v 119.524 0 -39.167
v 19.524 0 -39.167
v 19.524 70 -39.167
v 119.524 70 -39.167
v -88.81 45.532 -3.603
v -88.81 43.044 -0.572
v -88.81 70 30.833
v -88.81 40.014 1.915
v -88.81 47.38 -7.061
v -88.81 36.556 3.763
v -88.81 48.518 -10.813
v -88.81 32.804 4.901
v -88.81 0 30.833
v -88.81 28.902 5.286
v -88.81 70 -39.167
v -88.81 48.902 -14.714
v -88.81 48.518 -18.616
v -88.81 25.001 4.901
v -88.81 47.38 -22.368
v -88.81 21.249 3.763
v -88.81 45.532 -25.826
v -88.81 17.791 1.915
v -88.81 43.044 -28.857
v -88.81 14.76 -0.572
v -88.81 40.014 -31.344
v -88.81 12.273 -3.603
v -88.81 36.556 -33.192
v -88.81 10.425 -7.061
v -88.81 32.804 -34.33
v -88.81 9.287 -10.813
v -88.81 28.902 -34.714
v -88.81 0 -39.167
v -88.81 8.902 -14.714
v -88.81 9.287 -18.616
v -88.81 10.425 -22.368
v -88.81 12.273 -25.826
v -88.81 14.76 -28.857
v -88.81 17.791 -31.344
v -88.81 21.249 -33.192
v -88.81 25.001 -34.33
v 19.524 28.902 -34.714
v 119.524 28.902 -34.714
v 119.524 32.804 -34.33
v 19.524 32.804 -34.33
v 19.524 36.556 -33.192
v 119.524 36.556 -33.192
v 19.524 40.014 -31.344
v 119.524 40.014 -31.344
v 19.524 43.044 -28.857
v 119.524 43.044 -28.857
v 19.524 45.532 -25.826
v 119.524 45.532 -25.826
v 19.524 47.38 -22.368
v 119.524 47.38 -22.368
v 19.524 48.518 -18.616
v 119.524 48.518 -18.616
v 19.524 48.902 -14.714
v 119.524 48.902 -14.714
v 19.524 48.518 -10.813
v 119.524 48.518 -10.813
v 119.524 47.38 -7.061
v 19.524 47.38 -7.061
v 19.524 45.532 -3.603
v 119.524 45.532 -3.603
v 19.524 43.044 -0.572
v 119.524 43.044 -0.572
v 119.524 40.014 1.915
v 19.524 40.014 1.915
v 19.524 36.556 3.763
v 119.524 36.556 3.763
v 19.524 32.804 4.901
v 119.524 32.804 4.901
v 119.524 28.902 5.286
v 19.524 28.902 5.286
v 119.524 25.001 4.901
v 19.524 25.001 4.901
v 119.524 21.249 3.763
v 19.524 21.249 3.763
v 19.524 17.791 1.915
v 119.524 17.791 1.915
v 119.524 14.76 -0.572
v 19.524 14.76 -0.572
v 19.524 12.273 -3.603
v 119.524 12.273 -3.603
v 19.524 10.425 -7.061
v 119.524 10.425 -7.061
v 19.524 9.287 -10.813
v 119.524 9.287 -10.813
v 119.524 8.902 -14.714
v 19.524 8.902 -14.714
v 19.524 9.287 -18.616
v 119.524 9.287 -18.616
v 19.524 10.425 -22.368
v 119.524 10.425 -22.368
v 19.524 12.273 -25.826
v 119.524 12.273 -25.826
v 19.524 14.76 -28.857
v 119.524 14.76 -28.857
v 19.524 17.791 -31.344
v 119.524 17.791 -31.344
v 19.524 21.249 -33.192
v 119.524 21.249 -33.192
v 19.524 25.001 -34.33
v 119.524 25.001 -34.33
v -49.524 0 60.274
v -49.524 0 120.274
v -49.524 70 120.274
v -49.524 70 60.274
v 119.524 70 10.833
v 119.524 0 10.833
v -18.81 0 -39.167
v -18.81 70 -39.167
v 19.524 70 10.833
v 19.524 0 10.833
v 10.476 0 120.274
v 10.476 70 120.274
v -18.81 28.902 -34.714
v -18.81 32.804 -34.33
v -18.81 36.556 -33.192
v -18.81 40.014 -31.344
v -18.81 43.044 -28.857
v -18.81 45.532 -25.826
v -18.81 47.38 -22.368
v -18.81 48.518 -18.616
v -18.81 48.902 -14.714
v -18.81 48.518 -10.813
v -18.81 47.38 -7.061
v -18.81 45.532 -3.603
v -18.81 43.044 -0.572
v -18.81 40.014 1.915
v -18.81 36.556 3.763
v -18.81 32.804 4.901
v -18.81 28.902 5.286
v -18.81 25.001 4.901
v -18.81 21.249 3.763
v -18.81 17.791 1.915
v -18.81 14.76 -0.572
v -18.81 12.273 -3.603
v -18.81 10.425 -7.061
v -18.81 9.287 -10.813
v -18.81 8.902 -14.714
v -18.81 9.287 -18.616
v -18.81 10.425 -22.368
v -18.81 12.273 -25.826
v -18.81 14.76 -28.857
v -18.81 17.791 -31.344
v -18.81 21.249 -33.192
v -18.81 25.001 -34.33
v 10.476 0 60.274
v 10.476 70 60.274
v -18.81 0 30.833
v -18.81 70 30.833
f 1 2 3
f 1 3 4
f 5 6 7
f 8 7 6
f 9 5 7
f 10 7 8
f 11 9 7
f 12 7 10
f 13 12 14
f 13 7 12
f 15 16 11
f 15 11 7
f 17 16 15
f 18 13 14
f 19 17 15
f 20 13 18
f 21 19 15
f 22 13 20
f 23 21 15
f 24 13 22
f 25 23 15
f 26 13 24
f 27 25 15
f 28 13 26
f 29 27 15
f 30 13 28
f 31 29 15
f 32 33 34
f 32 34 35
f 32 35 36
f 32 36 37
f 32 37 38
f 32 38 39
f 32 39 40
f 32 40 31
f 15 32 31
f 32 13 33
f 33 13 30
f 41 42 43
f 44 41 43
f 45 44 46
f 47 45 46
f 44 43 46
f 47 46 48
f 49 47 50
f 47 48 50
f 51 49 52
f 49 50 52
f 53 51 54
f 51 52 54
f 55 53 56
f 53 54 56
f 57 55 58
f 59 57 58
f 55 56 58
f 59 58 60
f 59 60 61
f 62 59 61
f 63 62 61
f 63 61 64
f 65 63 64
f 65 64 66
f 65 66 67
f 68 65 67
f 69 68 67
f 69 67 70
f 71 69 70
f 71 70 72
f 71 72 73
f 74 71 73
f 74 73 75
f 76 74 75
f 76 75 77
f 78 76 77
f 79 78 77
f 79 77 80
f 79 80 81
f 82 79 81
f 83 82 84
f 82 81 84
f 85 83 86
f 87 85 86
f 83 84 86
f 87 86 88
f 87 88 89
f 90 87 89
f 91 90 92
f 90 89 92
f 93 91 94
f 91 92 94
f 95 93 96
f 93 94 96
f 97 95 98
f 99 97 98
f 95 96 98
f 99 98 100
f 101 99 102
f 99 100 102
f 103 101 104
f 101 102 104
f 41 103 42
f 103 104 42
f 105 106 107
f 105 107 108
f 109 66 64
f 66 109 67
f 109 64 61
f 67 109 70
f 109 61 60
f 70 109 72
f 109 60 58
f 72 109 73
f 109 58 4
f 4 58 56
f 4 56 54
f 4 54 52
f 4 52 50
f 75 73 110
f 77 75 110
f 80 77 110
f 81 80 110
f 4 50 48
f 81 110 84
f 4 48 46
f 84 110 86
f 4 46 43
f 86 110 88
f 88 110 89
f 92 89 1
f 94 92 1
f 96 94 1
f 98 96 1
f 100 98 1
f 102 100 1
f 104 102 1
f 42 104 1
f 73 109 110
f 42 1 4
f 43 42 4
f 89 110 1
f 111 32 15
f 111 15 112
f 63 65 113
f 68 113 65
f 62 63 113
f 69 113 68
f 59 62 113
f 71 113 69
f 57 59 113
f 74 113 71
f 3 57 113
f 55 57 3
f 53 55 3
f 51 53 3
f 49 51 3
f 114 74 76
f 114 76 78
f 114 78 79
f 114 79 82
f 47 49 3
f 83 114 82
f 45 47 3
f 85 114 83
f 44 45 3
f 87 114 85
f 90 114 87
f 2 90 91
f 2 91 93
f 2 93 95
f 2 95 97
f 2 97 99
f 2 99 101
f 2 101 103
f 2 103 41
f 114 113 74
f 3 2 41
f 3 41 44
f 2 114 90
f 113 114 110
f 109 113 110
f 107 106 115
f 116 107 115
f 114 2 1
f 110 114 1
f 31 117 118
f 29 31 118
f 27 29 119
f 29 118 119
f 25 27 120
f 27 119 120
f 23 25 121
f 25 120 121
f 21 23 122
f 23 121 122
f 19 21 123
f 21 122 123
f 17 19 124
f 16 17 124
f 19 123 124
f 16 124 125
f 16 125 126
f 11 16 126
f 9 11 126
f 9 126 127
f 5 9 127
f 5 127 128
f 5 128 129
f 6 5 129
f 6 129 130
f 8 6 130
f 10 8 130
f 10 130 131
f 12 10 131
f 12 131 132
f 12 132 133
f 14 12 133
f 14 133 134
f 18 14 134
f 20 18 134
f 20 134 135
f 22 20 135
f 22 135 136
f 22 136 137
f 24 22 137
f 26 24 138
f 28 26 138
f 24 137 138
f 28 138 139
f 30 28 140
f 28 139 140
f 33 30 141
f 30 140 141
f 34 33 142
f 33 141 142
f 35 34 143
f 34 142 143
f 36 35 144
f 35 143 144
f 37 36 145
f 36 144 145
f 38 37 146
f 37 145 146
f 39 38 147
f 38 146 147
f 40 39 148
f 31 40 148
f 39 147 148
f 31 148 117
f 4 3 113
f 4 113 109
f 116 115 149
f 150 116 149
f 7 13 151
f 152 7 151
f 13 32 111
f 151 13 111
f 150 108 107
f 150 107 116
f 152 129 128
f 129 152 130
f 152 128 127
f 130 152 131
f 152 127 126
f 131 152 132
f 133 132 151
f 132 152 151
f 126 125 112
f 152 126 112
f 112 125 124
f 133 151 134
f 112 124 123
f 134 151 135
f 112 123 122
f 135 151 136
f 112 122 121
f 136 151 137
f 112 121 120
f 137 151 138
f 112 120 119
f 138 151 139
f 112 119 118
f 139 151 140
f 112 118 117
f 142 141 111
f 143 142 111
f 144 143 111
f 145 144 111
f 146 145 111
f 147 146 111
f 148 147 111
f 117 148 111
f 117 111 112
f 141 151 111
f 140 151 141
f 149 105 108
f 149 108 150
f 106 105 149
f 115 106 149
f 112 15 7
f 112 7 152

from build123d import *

# Parameters (mm, degrees)
SKETCH2_W             = 70
SKETCH2_H             = 70
BOSS_EXTRUDE1_DEPTH   = 70
SKETCH2_W_2           = 100
SKETCH2_H_2           = 50
BOSS_EXTRUDE1_2_DEPTH = 70
SKETCH2_W_3           = 60
SKETCH2_H_3           = 60
BOSS_EXTRUDE1_3_DEPTH = 70
SKETCH3_R             = 20
CUT_EXTRUDE1_DEPTH    = 251.536786883


with BuildPart() as part:
    # Sketch2 → Boss-Extrude1 (new body)
    with BuildSketch(Plane(origin=(0, 0, 0), x_dir=(1, 0, 0), z_dir=(0, 1, 0))):
        with Locations((-53.80952381, 4.166666667)):
            Rectangle(SKETCH2_W, SKETCH2_H)
    extrude(amount=BOSS_EXTRUDE1_DEPTH)


with BuildPart() as body_2:
    # Sketch2 → Boss-Extrude1 2 (new body)
    with BuildSketch(Plane(origin=(0, 0, 0), x_dir=(1, 0, 0), z_dir=(0, 1, 0))):
        with Locations((69.523809524, 14.166666667)):
            Rectangle(SKETCH2_W_2, SKETCH2_H_2)
    extrude(amount=BOSS_EXTRUDE1_2_DEPTH)


with BuildPart() as body_3:
    # Sketch2 → Boss-Extrude1 3 (new body)
    with BuildSketch(Plane(origin=(0, 0, 0), x_dir=(1, 0, 0), z_dir=(0, 1, 0))):
        with Locations((-19.523809524, -90.274285714)):
            Rectangle(SKETCH2_W_3, SKETCH2_H_3)
    extrude(amount=BOSS_EXTRUDE1_3_DEPTH)


with BuildPart() as cut_extrude1_tool:
    # Sketch3 → Cut-Extrude1 (new, through all)
    with BuildSketch(Plane(origin=(119.523809524, 0, 0), x_dir=(0, 0, -1), z_dir=(1, 0, 0))):
        with Locations((14.714433962, 28.902329944)):
            Circle(SKETCH3_R)
    extrude(amount=-CUT_EXTRUDE1_DEPTH)


with BuildPart() as part_1:
    add(part.part)

    # Cut-Extrude1: cut by cut_extrude1_tool
    add(cut_extrude1_tool.part, mode=Mode.SUBTRACT)


with BuildPart() as body_2_1:
    add(body_2.part)

    # Cut-Extrude1: cut by cut_extrude1_tool
    add(cut_extrude1_tool.part, mode=Mode.SUBTRACT)


solid = Compound([body_3.part, part_1.part, body_2_1.part])
